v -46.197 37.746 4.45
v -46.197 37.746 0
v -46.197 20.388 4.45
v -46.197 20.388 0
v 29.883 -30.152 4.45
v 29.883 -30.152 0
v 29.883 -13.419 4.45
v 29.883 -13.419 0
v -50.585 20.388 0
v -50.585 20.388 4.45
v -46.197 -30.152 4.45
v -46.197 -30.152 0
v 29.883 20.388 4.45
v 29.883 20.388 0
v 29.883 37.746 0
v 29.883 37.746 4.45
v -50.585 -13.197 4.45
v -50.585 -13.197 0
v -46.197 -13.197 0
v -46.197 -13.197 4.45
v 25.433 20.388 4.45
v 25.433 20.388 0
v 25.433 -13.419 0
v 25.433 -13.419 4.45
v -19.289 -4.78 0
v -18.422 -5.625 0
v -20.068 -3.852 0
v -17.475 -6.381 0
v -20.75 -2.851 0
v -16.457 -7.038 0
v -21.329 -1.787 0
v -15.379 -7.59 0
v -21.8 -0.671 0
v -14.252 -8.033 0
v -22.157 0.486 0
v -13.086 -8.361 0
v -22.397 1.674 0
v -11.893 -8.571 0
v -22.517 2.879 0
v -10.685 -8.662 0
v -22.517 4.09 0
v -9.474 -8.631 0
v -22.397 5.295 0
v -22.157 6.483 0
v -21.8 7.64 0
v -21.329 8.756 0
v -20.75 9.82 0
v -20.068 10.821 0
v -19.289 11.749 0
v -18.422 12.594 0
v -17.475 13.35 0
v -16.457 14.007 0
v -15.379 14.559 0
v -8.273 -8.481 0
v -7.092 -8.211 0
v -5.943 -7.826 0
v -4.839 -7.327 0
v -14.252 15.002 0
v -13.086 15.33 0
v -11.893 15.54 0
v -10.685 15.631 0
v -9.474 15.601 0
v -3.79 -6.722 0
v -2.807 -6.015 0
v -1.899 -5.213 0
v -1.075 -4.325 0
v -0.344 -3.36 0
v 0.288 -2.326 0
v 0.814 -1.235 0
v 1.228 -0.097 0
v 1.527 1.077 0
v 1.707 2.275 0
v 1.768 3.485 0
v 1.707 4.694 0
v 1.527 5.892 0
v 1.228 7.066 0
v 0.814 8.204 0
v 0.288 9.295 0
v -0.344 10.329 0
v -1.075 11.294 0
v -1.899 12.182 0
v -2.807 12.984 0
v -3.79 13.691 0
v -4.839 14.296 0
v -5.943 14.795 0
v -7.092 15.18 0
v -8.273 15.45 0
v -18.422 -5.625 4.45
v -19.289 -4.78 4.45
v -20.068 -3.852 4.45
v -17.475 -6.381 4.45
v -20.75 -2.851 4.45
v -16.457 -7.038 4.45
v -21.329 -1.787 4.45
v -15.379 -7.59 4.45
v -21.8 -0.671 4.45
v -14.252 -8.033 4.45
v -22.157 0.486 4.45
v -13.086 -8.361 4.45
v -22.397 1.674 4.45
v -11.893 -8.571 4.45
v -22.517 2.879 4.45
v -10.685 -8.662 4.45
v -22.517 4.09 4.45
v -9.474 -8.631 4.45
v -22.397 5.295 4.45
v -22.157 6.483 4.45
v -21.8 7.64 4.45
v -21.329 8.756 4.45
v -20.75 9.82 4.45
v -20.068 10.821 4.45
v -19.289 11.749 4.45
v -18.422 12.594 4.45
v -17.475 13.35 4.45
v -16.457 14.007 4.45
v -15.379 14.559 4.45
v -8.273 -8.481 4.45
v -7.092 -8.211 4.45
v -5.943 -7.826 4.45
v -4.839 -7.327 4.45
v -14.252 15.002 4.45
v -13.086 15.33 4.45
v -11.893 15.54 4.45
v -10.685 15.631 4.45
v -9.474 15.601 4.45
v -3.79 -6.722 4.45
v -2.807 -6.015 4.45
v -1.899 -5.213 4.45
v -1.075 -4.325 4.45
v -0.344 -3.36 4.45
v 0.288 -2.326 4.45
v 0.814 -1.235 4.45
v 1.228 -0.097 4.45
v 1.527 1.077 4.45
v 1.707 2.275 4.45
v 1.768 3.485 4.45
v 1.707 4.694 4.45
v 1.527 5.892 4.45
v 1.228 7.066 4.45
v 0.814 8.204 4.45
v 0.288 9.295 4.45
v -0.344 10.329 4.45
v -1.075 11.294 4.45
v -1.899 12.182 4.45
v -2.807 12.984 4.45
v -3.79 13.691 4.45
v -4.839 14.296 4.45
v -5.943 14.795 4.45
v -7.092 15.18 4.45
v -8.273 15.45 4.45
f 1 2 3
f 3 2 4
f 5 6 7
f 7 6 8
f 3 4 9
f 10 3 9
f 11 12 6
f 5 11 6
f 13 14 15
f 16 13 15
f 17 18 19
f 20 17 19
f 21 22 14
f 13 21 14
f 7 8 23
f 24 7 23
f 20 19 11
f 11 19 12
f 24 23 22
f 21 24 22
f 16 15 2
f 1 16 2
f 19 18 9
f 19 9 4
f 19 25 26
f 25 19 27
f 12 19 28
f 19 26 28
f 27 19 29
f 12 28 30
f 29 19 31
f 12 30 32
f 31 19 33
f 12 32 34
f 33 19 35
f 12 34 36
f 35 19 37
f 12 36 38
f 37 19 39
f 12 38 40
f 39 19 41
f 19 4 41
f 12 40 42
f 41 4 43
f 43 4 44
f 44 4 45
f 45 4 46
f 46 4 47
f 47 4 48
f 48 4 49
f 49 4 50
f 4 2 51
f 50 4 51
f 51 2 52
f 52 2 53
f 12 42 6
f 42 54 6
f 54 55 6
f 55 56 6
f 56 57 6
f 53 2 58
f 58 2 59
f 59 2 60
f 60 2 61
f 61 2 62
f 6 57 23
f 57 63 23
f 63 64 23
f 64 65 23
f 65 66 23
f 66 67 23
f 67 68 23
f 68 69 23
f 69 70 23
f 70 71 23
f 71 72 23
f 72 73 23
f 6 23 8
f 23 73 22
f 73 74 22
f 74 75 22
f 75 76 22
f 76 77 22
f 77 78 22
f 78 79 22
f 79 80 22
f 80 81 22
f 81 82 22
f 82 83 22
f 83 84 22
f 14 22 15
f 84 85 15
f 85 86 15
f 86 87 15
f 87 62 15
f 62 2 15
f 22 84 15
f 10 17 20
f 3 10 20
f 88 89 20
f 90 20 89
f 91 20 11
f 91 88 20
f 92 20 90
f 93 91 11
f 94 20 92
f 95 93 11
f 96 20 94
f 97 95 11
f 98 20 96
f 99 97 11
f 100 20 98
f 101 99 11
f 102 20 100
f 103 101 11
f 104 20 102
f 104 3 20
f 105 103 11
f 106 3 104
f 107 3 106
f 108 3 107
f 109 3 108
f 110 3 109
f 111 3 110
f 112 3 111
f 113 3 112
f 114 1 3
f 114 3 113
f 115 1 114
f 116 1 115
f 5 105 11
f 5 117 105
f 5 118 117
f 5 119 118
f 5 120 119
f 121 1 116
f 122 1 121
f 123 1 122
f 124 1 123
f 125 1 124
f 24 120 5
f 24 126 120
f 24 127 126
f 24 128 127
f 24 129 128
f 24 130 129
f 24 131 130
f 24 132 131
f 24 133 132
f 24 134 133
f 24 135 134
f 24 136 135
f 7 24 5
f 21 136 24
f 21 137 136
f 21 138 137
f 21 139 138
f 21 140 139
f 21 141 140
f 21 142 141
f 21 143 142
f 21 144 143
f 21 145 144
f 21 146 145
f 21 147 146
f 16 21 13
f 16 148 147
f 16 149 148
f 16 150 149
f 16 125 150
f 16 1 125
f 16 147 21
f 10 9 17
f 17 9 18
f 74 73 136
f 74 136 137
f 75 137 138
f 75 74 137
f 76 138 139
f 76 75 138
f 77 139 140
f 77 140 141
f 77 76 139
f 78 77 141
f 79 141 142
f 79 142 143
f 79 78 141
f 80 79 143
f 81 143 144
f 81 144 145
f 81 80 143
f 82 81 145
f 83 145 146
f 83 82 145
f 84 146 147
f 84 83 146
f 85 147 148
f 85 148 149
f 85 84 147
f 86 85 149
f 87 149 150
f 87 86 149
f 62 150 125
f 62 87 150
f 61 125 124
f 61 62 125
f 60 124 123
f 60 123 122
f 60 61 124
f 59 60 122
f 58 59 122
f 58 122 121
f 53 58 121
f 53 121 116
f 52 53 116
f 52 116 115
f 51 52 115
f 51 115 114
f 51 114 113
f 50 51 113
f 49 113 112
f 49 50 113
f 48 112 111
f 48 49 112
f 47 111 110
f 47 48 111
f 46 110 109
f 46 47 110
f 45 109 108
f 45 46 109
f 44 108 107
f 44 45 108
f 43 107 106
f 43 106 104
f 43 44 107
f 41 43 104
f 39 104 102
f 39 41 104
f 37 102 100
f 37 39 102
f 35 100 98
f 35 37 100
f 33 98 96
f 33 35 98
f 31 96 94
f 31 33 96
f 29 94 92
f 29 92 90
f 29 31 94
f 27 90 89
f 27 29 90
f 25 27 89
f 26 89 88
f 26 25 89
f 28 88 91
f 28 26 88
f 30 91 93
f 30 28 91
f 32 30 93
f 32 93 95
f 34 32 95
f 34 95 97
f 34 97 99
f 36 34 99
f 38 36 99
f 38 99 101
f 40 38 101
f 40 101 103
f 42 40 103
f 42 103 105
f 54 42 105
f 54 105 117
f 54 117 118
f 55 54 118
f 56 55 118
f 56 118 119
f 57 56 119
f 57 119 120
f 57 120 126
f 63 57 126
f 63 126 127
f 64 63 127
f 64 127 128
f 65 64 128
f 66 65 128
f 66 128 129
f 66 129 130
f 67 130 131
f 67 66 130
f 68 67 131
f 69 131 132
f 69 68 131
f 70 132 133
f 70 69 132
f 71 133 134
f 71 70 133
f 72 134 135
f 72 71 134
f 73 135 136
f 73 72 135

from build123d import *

# Parameters (mm, degrees)
F0_R     = 12.15
F1_DEPTH = 4.45


with BuildPart() as f1:
    # F0 (on Top) → F1 (new body)
    with BuildSketch(Plane.XY):
        Polygon((-46.197247, 20.387878), (-50.585262, 20.387878), (-50.585262, -13.197176), (-46.197247, -13.197176), (-46.197247, -30.152489), (25.432527, -30.152489), (29.882527, -30.152489), (29.882527, -13.418792), (25.432527, -13.418792), (25.432527, 20.387878), (29.882527, 20.387878), (29.882527, 37.746087), (25.432527, 37.746087), (-46.197247, 37.746087), align=None)
        with Locations((-10.38236, 3.484543)):
            Circle(F0_R, mode=Mode.SUBTRACT)
    extrude(amount=F1_DEPTH)


solid = f1.part
